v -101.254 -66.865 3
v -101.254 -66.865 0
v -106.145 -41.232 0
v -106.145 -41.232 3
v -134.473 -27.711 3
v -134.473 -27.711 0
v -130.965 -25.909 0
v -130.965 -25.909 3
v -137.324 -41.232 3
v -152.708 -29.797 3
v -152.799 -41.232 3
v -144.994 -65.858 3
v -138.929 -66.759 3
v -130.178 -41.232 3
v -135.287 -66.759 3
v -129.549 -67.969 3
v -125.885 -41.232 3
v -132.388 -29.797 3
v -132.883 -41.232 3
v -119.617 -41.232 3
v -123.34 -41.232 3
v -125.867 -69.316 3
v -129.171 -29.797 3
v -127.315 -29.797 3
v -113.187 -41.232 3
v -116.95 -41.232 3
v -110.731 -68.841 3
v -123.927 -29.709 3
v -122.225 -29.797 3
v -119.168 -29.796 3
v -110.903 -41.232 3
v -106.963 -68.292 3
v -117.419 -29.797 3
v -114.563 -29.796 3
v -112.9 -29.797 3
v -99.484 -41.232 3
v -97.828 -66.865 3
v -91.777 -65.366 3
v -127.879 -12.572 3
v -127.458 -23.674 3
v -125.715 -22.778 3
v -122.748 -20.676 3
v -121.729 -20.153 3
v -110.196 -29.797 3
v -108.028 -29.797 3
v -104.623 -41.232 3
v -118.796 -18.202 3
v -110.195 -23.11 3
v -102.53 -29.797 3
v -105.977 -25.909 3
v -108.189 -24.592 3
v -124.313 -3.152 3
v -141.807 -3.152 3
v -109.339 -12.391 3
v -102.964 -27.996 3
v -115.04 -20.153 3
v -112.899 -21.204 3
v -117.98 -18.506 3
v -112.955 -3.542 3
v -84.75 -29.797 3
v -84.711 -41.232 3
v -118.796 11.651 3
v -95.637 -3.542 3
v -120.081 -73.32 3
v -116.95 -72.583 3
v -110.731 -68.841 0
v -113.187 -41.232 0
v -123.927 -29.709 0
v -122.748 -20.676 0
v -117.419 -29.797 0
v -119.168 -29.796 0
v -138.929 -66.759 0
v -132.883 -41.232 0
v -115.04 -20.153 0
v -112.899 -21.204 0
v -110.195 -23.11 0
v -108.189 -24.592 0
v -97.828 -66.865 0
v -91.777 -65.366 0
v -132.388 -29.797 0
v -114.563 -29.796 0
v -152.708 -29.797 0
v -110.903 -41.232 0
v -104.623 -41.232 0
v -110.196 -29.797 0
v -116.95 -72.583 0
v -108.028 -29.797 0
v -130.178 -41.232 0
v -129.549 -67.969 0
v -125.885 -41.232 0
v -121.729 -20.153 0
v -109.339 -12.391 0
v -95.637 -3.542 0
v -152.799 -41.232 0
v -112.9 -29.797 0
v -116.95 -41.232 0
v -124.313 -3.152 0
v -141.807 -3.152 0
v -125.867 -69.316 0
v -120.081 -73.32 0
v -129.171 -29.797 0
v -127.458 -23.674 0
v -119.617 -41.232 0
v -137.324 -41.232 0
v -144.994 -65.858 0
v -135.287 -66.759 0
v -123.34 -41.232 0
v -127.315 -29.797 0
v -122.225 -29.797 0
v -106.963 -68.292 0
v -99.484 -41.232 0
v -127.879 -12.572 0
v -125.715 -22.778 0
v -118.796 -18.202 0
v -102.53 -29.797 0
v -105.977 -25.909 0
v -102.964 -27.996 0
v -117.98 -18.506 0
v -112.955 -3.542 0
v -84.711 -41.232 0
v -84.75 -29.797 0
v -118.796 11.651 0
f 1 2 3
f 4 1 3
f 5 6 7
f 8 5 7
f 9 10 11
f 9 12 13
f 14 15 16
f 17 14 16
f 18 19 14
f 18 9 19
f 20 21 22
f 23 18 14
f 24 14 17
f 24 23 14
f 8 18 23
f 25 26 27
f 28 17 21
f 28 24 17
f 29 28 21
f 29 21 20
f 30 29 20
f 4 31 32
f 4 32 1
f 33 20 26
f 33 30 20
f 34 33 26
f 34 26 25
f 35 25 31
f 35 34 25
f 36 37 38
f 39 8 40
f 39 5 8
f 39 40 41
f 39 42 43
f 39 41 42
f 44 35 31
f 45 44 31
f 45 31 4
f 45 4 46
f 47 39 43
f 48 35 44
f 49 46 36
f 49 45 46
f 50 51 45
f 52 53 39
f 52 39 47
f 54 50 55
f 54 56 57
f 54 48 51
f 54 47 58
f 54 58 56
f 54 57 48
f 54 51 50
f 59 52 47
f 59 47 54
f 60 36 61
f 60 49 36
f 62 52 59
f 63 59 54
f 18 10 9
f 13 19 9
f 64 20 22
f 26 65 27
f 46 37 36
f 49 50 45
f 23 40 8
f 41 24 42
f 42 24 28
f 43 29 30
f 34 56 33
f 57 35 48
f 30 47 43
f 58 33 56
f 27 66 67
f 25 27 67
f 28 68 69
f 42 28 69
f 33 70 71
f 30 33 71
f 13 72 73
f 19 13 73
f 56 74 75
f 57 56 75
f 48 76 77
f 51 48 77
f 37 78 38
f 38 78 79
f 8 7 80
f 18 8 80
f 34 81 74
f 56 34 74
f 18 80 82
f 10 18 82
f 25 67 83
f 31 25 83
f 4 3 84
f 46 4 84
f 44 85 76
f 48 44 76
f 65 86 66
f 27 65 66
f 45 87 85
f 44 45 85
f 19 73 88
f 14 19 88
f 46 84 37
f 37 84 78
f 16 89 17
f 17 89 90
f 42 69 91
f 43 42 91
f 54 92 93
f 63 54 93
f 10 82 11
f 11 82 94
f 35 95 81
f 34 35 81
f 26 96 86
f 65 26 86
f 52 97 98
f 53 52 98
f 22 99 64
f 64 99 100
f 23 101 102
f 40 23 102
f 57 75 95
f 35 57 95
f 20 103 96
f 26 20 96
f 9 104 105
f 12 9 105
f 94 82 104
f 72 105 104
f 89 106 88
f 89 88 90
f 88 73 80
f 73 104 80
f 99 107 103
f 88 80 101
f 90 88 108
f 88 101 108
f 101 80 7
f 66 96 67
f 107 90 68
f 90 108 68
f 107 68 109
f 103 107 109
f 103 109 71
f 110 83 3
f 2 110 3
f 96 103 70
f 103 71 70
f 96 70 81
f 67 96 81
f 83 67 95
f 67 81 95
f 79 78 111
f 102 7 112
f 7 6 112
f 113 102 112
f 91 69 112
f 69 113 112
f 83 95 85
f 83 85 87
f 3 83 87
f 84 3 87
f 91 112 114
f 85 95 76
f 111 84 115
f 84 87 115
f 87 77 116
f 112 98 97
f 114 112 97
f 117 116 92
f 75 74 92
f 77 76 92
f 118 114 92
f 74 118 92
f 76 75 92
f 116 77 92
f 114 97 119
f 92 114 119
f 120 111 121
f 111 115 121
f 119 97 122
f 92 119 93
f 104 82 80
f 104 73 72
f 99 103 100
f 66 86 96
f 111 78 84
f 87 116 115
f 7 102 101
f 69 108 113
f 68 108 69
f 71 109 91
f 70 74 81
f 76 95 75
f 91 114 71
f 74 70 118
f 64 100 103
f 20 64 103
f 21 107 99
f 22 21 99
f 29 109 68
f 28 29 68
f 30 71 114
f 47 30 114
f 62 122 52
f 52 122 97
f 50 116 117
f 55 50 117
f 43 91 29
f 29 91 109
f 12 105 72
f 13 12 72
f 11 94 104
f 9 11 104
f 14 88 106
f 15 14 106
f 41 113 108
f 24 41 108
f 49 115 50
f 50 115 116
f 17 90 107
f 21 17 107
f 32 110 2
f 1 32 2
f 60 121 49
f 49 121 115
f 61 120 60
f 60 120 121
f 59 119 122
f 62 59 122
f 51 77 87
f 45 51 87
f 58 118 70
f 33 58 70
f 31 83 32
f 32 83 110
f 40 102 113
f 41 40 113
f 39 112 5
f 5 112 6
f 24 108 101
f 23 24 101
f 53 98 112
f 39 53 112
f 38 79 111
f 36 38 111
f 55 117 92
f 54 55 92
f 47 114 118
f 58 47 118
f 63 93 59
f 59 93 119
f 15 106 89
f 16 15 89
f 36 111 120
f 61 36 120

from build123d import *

# Parameters (mm, degrees)
F1_DEPTH = 3


with BuildPart() as f1:
    # F0 (on Top) → F1 (new body)
    with BuildSketch(Plane.XY):
        Polygon((-112.955246, -3.54154), (-118.796036, 11.650806), (-124.313387, -3.151842), (-141.807427, -3.151842), (-127.879479, -12.571709), (-134.473386, -27.710782), (-130.965268, -25.908628), (-132.387559, -29.796608), (-152.707559, -29.796608), (-152.799174, -41.2316), (-137.323676, -41.2316), (-144.994139, -65.857825), (-138.929132, -66.758923), (-132.882882, -41.2316), (-130.178067, -41.231918), (-135.287017, -66.759351), (-129.549282, -67.969184), (-125.885266, -41.2316), (-123.340191, -41.2319), (-125.867149, -69.316173), (-120.080659, -73.319617), (-119.616715, -41.2316), (-116.949647, -41.231914), (-116.949647, -72.583164), (-110.730788, -68.840947), (-113.186582, -41.2316), (-110.90286, -41.2316), (-106.963308, -68.292474), (-101.254005, -66.865148), (-106.145109, -41.2316), (-104.622629, -41.2316), (-97.828425, -66.865148), (-91.776701, -65.36576), (-99.484258, -41.2316), (-84.710565, -41.2319), (-84.749944, -29.796608), (-102.529944, -29.796608), (-105.977231, -25.908628), (-102.963967, -27.996385), (-109.339354, -12.390961), (-95.637031, -3.54154), align=None)
        Polygon((-129.171015, -29.796608), (-127.458225, -23.673594), (-125.715271, -22.778221), (-127.315492, -29.796608), align=None, mode=Mode.SUBTRACT)
        Polygon((-123.927363, -29.709139), (-122.748051, -20.676211), (-121.729279, -20.152858), (-122.224698, -29.796608), align=None, mode=Mode.SUBTRACT)
        Polygon((-119.167684, -29.796403), (-118.796036, -18.202179), (-117.97959, -18.506491), (-117.419369, -29.796608), align=None, mode=Mode.SUBTRACT)
        Polygon((-114.562619, -29.796413), (-115.040493, -20.152858), (-112.898951, -21.204401), (-112.899961, -29.796608), align=None, mode=Mode.SUBTRACT)
        Polygon((-110.19575, -29.796608), (-110.194964, -23.110219), (-108.188545, -24.591885), (-108.028096, -29.796608), align=None, mode=Mode.SUBTRACT)
    extrude(amount=F1_DEPTH)


solid = f1.part
